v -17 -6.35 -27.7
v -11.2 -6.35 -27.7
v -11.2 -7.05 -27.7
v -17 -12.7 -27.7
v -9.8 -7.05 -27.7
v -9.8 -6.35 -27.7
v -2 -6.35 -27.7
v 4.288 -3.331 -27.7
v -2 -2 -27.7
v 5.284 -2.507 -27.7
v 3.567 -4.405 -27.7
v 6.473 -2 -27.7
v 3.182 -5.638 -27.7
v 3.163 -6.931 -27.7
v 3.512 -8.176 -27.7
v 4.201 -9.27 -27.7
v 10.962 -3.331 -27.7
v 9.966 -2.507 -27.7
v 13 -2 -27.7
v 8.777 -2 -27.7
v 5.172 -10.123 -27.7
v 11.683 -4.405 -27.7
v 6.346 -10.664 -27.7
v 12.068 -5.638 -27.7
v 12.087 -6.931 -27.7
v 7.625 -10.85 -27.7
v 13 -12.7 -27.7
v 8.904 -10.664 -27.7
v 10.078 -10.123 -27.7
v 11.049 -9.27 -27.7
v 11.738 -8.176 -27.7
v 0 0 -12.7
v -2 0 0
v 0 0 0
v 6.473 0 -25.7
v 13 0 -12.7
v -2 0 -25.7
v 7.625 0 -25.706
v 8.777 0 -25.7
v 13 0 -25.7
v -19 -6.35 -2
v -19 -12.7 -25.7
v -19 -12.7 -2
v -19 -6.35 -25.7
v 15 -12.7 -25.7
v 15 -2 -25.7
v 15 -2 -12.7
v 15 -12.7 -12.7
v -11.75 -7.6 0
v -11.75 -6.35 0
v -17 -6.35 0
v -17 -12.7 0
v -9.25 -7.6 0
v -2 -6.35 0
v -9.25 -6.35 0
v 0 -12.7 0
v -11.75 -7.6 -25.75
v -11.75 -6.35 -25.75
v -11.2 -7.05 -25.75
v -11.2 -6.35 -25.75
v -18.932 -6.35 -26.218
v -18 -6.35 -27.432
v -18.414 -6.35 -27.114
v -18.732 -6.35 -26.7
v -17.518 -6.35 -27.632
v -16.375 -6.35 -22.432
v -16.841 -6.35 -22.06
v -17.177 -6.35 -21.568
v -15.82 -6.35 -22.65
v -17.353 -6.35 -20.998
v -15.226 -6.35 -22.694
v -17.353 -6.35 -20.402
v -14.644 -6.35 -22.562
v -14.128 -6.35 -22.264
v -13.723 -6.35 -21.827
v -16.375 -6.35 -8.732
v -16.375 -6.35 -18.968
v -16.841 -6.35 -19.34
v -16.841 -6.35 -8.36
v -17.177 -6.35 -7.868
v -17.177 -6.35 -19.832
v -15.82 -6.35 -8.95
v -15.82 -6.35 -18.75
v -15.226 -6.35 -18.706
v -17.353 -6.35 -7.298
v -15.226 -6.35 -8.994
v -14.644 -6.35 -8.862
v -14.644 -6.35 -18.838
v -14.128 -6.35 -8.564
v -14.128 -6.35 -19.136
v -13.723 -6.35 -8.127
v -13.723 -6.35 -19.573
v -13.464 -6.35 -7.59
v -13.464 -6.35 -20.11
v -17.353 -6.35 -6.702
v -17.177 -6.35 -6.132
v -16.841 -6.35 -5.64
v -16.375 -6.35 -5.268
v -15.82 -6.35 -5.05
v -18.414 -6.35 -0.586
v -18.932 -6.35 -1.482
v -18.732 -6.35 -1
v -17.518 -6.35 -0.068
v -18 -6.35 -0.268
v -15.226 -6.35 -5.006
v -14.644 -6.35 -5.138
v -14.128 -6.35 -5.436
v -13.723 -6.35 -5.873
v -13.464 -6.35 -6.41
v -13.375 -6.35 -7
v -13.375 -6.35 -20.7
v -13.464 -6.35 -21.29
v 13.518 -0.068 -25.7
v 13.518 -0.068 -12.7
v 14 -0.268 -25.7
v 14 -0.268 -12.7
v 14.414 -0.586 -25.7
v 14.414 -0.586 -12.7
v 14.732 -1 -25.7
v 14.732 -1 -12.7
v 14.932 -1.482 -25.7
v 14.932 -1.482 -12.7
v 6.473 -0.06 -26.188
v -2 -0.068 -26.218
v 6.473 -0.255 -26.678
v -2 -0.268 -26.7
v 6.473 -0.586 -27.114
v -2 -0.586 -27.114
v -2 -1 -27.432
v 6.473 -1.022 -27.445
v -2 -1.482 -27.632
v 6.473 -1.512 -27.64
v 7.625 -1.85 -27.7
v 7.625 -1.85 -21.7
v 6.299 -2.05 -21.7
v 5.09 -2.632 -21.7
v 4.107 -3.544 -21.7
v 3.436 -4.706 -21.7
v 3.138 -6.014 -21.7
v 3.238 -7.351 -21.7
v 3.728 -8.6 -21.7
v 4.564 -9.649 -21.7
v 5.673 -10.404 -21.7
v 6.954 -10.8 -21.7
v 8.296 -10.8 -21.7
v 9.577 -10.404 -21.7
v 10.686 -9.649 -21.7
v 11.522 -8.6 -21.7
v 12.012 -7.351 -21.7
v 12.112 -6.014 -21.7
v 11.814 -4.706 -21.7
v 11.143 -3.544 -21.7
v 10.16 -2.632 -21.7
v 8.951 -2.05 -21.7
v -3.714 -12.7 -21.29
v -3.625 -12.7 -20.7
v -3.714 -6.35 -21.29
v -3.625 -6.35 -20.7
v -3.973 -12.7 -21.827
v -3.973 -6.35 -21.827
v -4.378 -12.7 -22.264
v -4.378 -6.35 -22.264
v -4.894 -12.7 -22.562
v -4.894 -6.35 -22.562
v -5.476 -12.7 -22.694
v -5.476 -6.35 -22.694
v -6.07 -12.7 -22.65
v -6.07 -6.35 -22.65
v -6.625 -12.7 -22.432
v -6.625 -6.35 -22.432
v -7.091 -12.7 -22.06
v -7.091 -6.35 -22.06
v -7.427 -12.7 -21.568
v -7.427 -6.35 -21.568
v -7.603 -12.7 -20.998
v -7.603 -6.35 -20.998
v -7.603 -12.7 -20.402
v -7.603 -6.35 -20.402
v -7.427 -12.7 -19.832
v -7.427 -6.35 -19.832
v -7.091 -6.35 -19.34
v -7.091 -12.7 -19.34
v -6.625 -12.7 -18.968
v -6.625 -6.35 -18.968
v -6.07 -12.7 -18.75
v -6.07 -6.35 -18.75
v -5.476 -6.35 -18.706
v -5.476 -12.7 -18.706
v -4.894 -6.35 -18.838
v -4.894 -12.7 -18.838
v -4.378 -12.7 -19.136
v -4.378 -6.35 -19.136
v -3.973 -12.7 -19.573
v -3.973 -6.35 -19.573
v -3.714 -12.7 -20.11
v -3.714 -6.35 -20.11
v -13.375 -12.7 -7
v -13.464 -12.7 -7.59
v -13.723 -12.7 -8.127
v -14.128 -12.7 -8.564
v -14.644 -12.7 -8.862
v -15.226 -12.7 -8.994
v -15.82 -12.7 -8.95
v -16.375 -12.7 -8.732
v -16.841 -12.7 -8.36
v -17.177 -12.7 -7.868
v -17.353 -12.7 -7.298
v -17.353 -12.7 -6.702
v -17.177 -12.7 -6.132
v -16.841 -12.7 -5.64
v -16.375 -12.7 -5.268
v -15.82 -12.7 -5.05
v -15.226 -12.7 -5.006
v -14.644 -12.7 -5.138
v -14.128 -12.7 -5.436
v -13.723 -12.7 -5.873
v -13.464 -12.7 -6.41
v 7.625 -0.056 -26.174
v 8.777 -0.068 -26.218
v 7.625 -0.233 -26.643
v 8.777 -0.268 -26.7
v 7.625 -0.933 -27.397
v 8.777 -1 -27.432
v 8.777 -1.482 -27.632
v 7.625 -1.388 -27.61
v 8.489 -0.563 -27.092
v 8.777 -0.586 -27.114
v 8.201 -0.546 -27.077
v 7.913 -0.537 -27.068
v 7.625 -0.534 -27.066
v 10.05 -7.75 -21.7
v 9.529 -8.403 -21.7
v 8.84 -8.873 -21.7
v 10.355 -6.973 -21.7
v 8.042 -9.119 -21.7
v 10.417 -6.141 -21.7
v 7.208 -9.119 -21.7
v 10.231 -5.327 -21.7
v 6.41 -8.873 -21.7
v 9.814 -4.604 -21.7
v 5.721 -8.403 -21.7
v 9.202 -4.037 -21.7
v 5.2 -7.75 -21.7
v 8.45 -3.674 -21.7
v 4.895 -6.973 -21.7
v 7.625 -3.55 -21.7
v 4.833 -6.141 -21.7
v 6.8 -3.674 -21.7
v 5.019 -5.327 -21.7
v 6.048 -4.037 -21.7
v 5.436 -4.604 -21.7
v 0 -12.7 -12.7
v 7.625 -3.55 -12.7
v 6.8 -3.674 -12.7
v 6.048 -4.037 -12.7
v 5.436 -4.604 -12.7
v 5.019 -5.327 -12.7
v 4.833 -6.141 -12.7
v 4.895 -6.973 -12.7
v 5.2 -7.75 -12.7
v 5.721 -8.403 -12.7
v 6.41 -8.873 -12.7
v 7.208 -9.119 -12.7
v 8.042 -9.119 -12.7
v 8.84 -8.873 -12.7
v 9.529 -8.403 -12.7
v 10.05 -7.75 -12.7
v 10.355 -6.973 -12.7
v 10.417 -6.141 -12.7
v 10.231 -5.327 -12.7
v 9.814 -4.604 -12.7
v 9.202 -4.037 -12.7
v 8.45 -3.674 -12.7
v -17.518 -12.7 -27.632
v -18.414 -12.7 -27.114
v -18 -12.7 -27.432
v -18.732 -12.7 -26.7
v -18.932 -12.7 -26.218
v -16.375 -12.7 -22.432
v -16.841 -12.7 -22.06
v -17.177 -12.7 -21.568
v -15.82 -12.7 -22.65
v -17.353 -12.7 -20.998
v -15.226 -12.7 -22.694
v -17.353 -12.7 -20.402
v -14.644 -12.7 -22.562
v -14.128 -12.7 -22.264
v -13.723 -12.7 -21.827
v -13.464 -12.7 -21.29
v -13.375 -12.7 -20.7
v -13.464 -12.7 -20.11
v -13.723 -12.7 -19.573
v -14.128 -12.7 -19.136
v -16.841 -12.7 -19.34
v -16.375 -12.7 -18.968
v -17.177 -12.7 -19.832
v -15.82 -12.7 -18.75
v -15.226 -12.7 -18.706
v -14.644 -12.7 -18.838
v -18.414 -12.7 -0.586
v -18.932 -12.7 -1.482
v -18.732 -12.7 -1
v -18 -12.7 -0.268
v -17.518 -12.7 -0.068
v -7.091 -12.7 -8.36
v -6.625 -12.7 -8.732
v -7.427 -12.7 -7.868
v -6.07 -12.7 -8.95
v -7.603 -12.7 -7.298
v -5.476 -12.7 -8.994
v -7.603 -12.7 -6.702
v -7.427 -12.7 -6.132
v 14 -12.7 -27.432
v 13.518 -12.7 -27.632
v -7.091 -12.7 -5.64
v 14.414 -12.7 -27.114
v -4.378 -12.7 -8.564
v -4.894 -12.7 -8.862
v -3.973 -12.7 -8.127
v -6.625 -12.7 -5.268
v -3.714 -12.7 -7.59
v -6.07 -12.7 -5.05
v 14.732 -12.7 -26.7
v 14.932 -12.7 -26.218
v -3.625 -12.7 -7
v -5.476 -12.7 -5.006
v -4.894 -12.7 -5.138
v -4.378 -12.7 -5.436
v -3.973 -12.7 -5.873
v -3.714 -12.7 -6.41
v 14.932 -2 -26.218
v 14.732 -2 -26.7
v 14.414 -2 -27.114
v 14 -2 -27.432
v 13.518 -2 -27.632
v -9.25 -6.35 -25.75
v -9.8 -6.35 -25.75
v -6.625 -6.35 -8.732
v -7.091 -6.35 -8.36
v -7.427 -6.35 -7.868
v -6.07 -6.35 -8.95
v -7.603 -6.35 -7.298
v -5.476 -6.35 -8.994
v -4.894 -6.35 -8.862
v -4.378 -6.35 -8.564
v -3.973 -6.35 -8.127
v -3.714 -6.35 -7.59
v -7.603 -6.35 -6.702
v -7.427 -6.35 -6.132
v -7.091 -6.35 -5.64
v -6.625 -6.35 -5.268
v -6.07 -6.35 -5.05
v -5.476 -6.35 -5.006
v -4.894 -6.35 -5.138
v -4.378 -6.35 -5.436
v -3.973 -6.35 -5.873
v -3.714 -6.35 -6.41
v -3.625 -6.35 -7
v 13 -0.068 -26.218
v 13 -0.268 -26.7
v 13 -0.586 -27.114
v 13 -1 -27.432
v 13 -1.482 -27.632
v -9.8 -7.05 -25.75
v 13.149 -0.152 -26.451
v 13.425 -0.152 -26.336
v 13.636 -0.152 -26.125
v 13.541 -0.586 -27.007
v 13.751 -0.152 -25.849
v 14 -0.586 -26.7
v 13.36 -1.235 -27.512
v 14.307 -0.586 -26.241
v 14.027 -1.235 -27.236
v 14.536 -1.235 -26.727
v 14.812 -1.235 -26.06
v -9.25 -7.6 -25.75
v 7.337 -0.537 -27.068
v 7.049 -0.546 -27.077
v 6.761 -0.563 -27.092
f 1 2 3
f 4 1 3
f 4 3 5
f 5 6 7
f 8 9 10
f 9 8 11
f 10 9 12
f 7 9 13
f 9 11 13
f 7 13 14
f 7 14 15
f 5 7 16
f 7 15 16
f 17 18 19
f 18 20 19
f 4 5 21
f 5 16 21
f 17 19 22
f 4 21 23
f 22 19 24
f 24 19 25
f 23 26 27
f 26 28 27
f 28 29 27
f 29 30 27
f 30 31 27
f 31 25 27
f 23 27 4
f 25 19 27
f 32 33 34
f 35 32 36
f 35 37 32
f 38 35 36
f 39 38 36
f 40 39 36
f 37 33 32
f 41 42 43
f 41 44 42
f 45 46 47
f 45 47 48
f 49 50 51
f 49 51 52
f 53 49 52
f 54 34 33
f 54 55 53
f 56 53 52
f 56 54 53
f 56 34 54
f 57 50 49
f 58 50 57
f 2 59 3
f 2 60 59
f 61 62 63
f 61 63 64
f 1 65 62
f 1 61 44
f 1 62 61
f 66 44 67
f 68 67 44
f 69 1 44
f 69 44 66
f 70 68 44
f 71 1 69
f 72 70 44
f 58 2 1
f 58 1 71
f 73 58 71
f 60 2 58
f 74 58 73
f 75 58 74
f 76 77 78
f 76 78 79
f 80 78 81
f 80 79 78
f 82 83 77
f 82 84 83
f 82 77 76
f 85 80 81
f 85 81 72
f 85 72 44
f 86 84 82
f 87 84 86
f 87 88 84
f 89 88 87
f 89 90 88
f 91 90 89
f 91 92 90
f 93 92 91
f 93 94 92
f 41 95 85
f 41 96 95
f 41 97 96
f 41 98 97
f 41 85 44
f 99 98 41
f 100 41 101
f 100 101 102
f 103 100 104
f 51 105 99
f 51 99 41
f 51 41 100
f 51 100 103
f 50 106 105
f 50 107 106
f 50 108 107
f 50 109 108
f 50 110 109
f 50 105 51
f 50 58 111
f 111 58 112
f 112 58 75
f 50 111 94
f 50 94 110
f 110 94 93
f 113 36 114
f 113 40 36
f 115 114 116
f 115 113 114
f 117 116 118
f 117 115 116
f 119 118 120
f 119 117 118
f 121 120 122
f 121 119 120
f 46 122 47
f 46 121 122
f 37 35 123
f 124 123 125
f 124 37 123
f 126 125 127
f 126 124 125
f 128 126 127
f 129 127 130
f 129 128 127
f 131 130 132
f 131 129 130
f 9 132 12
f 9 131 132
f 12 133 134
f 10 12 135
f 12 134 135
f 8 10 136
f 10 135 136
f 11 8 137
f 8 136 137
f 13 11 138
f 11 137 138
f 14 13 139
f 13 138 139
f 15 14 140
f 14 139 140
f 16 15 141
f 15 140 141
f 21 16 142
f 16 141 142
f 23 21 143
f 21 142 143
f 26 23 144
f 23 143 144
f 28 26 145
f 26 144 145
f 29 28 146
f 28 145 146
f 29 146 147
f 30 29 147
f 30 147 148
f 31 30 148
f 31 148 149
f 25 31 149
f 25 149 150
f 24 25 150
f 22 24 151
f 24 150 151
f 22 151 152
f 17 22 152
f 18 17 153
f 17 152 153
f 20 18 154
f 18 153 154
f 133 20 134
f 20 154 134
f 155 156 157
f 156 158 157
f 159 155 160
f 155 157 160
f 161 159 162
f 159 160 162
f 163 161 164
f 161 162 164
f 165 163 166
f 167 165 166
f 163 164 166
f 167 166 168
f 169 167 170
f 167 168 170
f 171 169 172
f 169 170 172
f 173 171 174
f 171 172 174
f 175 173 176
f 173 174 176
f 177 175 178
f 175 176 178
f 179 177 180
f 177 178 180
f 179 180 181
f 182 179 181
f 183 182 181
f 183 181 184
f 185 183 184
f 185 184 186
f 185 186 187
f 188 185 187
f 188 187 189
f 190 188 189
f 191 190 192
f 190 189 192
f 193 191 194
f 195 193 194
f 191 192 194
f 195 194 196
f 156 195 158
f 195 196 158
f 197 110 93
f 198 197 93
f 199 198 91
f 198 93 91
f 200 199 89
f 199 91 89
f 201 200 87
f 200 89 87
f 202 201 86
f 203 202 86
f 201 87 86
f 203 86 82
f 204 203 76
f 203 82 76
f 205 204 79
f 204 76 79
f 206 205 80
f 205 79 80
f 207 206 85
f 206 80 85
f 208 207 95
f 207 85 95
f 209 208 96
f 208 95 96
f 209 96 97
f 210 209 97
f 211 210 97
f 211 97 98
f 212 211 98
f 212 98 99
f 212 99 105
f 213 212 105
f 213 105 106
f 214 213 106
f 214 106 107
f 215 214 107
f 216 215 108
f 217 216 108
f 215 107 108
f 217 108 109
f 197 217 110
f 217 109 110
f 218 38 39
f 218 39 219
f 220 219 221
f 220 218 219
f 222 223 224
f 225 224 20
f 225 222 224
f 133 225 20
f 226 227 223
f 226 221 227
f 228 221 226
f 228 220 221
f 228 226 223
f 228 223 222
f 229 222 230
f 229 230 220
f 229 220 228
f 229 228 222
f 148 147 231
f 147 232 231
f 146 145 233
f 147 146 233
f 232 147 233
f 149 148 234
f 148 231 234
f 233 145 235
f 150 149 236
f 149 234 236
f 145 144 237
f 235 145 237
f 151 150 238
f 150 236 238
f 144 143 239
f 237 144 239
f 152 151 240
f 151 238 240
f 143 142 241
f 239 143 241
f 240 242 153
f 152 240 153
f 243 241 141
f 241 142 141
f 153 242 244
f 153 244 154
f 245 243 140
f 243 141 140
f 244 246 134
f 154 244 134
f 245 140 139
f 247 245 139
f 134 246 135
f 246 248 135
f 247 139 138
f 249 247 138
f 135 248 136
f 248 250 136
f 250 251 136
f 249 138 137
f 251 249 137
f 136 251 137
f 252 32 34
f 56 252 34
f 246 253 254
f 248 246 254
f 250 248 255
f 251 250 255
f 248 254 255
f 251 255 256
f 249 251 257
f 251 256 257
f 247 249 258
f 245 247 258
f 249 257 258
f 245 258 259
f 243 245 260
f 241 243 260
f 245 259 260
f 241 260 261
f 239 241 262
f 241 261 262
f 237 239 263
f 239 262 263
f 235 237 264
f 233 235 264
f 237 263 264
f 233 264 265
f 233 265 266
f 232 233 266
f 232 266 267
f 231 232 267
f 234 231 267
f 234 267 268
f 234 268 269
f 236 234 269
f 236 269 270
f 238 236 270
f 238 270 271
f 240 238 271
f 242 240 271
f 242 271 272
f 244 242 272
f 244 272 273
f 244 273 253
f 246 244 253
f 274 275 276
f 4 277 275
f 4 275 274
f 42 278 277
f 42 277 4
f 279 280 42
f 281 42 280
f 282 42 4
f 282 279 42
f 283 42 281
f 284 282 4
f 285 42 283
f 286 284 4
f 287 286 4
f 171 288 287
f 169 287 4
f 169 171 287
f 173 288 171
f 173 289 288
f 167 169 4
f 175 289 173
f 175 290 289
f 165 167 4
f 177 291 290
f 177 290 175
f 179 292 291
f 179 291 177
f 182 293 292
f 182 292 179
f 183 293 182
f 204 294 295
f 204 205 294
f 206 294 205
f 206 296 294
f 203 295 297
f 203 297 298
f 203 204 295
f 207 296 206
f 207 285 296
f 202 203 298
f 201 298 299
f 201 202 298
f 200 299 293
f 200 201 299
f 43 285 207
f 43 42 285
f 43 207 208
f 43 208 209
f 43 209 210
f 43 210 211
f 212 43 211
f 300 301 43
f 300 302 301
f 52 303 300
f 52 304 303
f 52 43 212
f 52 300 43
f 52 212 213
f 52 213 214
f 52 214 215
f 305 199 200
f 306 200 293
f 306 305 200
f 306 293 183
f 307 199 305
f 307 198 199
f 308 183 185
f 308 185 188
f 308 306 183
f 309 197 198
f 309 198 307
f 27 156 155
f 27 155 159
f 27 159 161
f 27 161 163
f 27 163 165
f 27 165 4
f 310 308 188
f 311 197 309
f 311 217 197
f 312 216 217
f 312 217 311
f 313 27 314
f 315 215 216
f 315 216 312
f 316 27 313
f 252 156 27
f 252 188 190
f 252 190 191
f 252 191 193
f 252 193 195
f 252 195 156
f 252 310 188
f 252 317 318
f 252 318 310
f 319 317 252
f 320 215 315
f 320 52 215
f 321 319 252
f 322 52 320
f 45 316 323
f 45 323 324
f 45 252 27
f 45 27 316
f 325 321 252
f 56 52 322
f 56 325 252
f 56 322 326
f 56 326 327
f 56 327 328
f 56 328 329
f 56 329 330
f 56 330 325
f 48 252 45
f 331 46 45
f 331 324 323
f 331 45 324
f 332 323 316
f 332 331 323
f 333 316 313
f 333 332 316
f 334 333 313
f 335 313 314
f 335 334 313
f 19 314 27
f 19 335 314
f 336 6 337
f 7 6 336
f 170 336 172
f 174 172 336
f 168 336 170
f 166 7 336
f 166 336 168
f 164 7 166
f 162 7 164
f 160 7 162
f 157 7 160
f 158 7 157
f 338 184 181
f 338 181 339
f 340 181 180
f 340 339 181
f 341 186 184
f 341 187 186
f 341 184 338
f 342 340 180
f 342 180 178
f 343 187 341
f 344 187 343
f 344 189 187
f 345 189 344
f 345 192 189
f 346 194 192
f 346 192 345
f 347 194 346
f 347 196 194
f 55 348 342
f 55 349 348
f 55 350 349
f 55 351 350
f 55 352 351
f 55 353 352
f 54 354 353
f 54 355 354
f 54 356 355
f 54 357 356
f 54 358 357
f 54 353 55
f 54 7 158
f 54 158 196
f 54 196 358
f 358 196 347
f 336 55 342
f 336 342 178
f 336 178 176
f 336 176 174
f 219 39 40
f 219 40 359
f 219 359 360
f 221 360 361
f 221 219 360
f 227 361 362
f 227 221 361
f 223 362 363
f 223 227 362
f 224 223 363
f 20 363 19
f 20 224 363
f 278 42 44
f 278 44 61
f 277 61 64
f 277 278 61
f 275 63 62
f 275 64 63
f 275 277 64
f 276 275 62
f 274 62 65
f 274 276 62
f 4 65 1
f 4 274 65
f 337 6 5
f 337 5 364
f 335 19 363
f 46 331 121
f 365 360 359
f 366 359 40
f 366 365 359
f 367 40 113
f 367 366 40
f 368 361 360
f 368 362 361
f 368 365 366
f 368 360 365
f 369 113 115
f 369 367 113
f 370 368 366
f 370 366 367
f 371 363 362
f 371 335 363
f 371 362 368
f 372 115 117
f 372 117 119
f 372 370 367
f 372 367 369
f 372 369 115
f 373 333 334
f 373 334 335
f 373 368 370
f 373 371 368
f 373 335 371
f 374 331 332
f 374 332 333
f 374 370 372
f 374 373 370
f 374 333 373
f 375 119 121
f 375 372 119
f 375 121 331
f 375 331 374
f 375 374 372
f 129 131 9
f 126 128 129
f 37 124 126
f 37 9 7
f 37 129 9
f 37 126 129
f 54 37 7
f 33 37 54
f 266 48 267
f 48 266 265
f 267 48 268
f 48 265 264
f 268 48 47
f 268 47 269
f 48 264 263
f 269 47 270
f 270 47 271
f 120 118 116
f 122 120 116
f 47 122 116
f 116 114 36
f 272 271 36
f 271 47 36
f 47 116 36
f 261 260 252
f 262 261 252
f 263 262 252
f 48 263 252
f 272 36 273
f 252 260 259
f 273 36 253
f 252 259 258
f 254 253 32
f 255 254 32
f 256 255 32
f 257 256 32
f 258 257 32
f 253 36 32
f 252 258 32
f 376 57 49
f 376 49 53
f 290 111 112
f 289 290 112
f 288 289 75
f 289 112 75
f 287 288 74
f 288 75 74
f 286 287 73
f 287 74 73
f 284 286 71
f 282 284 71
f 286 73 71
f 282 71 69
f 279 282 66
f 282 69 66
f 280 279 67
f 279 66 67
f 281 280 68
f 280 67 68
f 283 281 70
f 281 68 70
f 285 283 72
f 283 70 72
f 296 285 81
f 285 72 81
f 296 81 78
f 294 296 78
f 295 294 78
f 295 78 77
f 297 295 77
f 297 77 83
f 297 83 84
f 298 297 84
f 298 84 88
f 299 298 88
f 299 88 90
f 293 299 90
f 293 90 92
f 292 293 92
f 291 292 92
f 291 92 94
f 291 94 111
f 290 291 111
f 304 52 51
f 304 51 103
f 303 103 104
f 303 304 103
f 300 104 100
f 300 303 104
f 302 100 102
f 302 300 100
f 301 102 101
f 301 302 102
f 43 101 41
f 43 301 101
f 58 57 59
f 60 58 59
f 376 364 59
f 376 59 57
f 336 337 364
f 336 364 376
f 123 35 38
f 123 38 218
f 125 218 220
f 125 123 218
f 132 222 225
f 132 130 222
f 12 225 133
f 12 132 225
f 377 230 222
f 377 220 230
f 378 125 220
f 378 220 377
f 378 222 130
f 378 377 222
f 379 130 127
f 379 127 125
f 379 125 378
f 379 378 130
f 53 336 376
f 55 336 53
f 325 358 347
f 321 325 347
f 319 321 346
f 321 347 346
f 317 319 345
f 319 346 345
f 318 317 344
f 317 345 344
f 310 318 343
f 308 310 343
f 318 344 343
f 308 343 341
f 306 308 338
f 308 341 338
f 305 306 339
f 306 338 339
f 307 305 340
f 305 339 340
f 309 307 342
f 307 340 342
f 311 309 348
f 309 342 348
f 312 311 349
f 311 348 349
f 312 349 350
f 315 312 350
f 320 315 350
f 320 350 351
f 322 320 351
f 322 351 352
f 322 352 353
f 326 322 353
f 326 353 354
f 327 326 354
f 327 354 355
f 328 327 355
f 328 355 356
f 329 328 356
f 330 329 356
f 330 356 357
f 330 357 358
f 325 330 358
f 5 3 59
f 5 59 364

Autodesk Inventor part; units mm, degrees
ref_plane "YZ Plane" through (0, 0, 0) normal (1, 0, 0) x (0, 1, 0)
ref_plane "XZ Plane" through (0, 0, 0) normal (0, 1, 0) x (-1, 0, 0)
ref_plane "Arbeitsebene1" through (0, 0, -12.7) normal (0, 0, -1) x (-1, 0, 0)
sketch "Skizze2" plane through (0, 0, -12.7) normal (0, 0, -1) x (-1, 0, 0)
  line L0 (-55.25, 0) -> (-55.25, -12.7) projected
  line L1 (0, -12.7) -> (-55.25, -12.7) projected
  line L2 (0, 0) -> (0, -12.7) projected
  line L3 (0, 0) -> (-55.25, 0) projected
  circle A0 centre (-47.625, -6.35) radius 2.75 projected
  circle A1 centre (-7.625, -6.35) radius 2.75 projected
  line L4 (0, 1.15) -> (-15, 1.15)
  line L5 (-15, 1.15) -> (-15, -13.85)
  line L6 (-15, -13.85) -> (0, -13.85)
  line L7 (0, -13.85) -> (0, 1.15)
  point P0 (-15, -6.35)
  dimension "d1" = 15
  dimension "d2" = 0
  dimension "d3" = 15
extrude "Extrusion1" add sketch "Skizze2" along normal blind 15 contours L5 L4 L7 L3 | L3 L2 L1 L5 | L1 L7 L6 L5 | A1
sketch "Skizze3" plane through (0, -13.85, -12.7) normal (-1, 0, 0) x (0, 0, 1)
  line L0 (12.7, 1.15) -> (12.7, 13.85) projected
  line L1 (-15, 0) -> (-15, 15) projected
  line L2 (-15, 15) -> (12.7, 15)
  line L3 (12.7, 15) -> (12.7, 0)
  line L4 (12.7, 0) -> (-15, 0)
  line L5 (-15, 0) -> (-15, 15)
  line L6 (0, 0) -> (-15, 0) projected
extrude "Extrusion2" add sketch "Skizze3" along normal blind 2
sketch "Skizze4" plane through (-2, -13.85, -12.7) normal (-1, 0, 0) x (0, 0, 1)
  line L0 (0, 0) -> (12.7, 0) projected
  line L1 (-15, 15) -> (-15, 0) projected
  line L2 (12.7, 0) -> (-15, 0)
  line L3 (-15, 0) -> (-15, 7.5)
  line L4 (-15, 7.5) -> (12.7, 7.5)
  line L5 (12.7, 7.5) -> (12.7, 0)
  line L6 (12.7, 0) -> (12.7, 15) projected
  point P0 (12.7, 13.85)
  point P1 (12.7, 7.5)
  point P2 (-1.15, 7.5)
extrude "Extrusion3" add sketch "Skizze4" along normal blind 17
sketch "Skizze5" plane through (-2, -6.35, 0) normal (0, 1, 0) x (1, 0, 0)
  line L0 (0, 27.7) -> (-17, 27.7) projected
  line L1 (0, 0) -> (0, 27.7) projected
  line L2 (0, 0) -> (-17, 0) projected
  line L3 (-17, 0) -> (-17, 27.7) projected
  line L4 (-7.25, 0) -> (-9.75, 0)
  line L5 (-9.75, 0) -> (-9.75, 25.75)
  line L6 (-9.75, 25.75) -> (-7.25, 25.75)
  line L7 (-7.25, 25.75) -> (-7.25, 0)
  point P0 (2, 0)
  point P1 (-8.5, 0)
  point P2 (-8.5, 0)
  dimension "d10" = 2.5
  dimension "d17" = 25.75
extrude "Extrusion4" cut sketch "Skizze5" against normal blind 1.25 contours L2 L5 L6 L7
sketch "Skizze6" plane through (-2, -6.35, 0) normal (0, 1, 0) x (1, 0, 0)
  line L0 (-9.75, 25.75) -> (-7.25, 25.75) projected
  line L1 (-7.25, 25.75) -> (-7.25, 0) projected
  line L2 (-9.75, 0) -> (-9.75, 25.75) projected
  line L3 (0, 27.7) -> (-17, 27.7) projected
  line L4 (-9.75, 25.75) -> (-7.25, 25.75) projected
  line L5 (-7.8, 25.75) -> (-9.2, 25.75)
  line L6 (-9.2, 25.75) -> (-9.2, 27.7)
  line L7 (-9.2, 27.7) -> (-7.8, 27.7)
  line L8 (-7.8, 27.7) -> (-7.8, 25.75)
  point P0 (2, 0)
  point P1 (-8.5, 25.75)
  point P2 (-8.5, 25.75)
  point P3 (-7.8, 27.7)
  dimension "d14" = 1.4
extrude "Extrusion5" cut sketch "Skizze6" against normal blind 0.7
sketch "Skizze7" plane through (-2, -6.35, 0) normal (0, 1, 0) x (1, 0, 0)
  circle A0 centre (-3.625, 7) radius 2
  circle A1 centre (-13.375, 7) radius 2
  circle A2 centre (-13.375, 20.7) radius 2
  circle A3 centre (-3.625, 20.7) radius 2
  line L0 (0, 0) -> (-7.25, 0) projected
  line L1 (-9.75, 0) -> (-17, 0) projected
  line L2 (-9.2, 27.7) -> (-17, 27.7) projected
  point P0 (2, 0)
  point P1 (-3.625, 0)
  point P2 (-13.375, 0)
  dimension "d18" = 4
  dimension "d19" = 4
  dimension "d20" = 4
  dimension "d21" = 4
  dimension "d22" = 7
  dimension "d23" = 7
extrude "Extrusion6" cut sketch "Skizze7" against normal blind 10
sketch "Skizze9" plane through (0, 0, -27.7) normal (0, 0, -1) x (-1, 0, 0)
  circle A0 centre (-7.625, -6.35) radius 2.75 projected
  point P0 (0, 0)
hole "Bohrung1" at (7.625, -6.35, -27.7) direction (0, 0, 1) diameter 5.6 depth 15 counterbore diameter 9 counterbore depth 6
sketch "Skizze10" plane through (0, 1.15, -12.7) normal (0, 1, 0) x (1, 0, 0)
  line L0 (19, -16) -> (-4, -16)
  line L1 (-4, -16) -> (-4, 20)
  line L2 (-4, 20) -> (19, 20)
  line L3 (19, 20) -> (19, -16)
  point P0 (0, -12.7)
extrude "Extrusion8" cut sketch "Skizze10" against normal blind 1.15
sketch "Skizze11" plane through (15, -13.85, -27.7) normal (0, -1, 0) x (1, 0, 0)
  line L0 (6, 49) -> (-39, 49)
  line L1 (-39, 49) -> (-39, -17)
  line L2 (-39, -17) -> (6, -17)
  line L3 (6, -17) -> (6, 49)
  point P0 (-15, 27.7)
extrude "Extrusion9" cut sketch "Skizze11" against normal blind 1.15
fillet "Rundung2" radius 2 5 edges at (-19, -9.525, -27.7) (-19, -9.525, 0) (15, -6.35, -27.7) (15, 0, -20.2) (6.5, 0, -27.7)
equation "\"d19\" = d18"
equation "\"d20\" = d19"
equation "\"d21\" = d19"
equation "\"d23\" = d22"
properties part number "NadelhalterSchraub"
